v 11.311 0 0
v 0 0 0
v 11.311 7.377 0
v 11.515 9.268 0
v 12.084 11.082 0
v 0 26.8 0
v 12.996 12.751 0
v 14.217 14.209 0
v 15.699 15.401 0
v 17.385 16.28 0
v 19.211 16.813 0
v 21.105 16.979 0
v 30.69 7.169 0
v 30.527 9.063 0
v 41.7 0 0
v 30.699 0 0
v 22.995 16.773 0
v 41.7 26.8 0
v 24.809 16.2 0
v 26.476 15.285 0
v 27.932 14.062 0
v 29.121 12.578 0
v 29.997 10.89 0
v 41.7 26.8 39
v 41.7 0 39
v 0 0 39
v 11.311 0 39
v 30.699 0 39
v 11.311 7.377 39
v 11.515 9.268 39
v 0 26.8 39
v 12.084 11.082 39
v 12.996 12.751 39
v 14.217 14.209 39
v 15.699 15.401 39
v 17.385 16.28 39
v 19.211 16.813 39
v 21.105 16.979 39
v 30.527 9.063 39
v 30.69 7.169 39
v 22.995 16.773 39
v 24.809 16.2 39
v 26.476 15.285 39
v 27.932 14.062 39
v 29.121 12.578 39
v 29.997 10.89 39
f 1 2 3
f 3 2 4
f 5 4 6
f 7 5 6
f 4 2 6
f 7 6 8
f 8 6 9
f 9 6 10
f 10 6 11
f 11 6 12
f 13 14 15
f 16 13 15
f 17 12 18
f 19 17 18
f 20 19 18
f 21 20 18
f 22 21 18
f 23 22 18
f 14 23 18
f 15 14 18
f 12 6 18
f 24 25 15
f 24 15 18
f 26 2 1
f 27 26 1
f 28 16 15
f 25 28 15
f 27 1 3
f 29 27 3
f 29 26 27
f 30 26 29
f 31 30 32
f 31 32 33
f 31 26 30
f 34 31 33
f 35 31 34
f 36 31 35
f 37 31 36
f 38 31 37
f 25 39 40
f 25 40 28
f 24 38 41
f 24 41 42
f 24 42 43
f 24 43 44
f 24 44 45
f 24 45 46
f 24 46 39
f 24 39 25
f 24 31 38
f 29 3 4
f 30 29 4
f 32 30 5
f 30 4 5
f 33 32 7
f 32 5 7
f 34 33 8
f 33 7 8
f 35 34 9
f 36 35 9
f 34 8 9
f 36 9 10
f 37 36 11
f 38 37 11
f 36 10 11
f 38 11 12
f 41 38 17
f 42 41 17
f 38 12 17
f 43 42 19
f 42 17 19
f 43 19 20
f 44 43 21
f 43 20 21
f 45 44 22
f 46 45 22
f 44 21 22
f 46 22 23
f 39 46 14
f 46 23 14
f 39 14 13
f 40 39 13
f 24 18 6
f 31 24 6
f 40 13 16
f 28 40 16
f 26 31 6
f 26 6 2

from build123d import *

# Parameters (mm, degrees)
F1_DEPTH = 39


with BuildPart() as f1:
    # F0 (on Top) → F1 (new body)
    with BuildSketch(Plane.XY):
        with BuildLine():
            Line((0, 26.80001), (0, 0))
            Line((0, 0), (11.311256, 0))
            Line((11.311256, 0), (11.311256, 7.377124))
            ThreePointArc((11.311256, 7.377124), (21.105051, 16.979474), (30.690106, 7.168752))
            Line((30.690106, 7.168752), (30.699241, 0))
            Line((30.699241, 0), (41.7, 0))
            Line((41.7, 0), (41.7, 26.80001))
            Line((41.7, 26.80001), (0, 26.80001))
        make_face()
    extrude(amount=F1_DEPTH)


solid = f1.part
